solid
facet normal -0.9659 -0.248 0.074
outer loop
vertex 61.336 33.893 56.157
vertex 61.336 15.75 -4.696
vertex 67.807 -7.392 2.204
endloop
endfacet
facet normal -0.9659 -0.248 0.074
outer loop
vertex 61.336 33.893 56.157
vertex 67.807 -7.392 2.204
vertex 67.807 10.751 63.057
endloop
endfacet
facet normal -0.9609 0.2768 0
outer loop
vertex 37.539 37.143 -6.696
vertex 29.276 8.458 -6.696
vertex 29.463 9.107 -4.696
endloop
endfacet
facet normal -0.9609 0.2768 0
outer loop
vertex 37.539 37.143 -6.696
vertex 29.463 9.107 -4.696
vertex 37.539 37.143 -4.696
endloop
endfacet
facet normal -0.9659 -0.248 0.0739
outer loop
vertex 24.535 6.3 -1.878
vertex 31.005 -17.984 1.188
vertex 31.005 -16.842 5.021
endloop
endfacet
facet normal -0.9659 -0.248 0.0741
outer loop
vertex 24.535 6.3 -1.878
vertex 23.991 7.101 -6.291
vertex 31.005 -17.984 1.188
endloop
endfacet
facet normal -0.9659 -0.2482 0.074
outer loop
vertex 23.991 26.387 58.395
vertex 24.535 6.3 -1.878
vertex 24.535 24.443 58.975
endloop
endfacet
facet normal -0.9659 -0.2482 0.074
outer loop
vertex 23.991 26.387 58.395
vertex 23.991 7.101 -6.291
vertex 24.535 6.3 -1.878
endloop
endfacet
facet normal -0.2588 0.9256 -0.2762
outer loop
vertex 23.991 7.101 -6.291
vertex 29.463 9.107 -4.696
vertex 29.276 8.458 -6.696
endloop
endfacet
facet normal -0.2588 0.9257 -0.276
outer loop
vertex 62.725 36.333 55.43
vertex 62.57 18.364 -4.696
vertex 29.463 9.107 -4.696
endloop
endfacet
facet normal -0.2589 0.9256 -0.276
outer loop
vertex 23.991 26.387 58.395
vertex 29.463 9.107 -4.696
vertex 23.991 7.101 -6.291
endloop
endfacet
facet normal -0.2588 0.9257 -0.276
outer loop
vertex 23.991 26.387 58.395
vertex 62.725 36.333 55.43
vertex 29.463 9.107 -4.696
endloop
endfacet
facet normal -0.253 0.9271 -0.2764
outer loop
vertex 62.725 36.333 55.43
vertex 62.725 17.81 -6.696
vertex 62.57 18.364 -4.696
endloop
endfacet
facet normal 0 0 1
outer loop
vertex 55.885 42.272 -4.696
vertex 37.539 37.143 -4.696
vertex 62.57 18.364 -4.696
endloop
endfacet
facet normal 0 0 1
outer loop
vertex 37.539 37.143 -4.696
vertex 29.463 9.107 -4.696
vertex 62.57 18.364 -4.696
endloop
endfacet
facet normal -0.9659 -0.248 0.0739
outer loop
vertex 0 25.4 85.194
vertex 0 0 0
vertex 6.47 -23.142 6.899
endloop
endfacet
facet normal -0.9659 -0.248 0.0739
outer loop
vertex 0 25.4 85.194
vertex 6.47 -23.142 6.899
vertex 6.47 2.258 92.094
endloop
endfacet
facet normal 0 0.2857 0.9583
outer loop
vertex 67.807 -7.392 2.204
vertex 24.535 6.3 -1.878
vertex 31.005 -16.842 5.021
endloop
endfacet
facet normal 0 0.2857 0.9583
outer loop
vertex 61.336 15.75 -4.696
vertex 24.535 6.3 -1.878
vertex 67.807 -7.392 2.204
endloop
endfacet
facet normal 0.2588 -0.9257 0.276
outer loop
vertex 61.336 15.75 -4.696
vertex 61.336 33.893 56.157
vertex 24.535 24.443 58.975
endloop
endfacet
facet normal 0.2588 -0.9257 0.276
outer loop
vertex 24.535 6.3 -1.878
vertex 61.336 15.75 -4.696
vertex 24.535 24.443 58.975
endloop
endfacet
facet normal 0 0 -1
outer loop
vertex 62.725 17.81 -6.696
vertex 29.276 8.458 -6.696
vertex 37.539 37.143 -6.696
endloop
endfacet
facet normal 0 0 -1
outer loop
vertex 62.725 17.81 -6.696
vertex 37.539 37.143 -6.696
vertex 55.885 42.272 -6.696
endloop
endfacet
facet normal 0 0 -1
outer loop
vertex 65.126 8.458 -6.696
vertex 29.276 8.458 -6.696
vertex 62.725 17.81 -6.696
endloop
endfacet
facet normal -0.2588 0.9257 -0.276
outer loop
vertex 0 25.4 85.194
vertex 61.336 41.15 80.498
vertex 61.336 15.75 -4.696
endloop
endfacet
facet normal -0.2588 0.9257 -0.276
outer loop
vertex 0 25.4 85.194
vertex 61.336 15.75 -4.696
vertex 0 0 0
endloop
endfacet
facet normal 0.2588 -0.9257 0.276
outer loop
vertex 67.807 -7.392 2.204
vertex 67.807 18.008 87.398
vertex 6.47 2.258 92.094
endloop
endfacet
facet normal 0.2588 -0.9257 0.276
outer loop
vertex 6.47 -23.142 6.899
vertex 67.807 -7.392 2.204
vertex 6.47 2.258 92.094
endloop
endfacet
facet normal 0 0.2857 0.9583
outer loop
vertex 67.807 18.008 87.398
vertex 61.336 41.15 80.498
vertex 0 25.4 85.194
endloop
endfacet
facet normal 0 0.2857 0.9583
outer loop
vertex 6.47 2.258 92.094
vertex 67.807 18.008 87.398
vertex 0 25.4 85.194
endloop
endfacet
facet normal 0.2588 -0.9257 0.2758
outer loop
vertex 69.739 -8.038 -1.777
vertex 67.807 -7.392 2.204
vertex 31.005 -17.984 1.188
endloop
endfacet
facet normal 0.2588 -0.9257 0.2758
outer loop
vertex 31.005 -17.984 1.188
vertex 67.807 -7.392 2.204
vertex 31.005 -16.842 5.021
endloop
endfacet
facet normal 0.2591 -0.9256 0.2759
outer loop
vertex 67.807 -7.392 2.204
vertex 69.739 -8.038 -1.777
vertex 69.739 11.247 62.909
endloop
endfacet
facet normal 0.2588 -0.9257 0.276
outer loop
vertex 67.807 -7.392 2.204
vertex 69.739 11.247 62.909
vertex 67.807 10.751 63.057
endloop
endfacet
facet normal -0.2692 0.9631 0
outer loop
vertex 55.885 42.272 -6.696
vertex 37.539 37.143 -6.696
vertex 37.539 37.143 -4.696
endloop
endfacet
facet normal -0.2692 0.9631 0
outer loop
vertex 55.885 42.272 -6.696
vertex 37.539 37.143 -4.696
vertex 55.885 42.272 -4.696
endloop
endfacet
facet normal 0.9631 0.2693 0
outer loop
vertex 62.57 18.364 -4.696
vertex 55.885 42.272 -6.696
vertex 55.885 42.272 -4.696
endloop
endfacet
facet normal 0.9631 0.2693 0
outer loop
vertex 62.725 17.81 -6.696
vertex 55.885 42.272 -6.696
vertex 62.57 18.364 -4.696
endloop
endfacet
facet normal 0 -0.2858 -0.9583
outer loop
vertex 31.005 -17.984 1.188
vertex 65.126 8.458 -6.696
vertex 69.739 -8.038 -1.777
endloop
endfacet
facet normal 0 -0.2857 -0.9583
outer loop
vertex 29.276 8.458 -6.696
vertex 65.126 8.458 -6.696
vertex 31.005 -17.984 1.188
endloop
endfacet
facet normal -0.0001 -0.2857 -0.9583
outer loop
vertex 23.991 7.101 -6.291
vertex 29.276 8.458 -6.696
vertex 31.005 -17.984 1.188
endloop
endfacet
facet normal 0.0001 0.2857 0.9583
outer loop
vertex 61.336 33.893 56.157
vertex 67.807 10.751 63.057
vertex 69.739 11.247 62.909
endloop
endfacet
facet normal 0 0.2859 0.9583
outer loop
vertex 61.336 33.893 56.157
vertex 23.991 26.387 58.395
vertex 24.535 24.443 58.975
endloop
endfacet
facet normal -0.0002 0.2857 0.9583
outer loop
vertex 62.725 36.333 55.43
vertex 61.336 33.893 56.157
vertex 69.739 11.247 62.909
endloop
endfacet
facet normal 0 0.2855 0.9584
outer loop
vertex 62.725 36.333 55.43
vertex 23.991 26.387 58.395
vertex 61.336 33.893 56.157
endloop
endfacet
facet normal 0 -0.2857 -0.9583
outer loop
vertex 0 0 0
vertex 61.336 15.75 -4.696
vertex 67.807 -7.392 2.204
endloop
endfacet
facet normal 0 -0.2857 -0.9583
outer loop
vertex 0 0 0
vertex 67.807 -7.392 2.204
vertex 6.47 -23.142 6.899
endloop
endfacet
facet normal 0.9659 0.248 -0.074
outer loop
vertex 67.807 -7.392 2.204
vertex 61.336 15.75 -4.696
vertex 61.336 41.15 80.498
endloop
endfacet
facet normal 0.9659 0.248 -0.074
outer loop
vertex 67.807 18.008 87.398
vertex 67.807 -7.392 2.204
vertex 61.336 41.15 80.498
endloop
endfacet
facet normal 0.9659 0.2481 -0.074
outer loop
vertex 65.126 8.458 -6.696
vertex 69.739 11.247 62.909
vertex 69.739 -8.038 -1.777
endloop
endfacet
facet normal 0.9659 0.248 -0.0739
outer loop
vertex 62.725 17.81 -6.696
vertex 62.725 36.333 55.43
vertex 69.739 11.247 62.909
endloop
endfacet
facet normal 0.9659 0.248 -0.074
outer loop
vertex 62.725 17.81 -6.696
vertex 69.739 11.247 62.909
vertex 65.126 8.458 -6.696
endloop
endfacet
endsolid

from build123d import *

# Parameters (mm, degrees)
F2_W      = 63.5
F2_H      = 88.9
F3_DEPTH  = 25
F5_W      = 38.1
F5_H      = 63.5
F6_DEPTH  = 2.1
F7_DEPTH  = 25
F10_DEPTH = 25
F12_DEPTH = 2


with BuildPart() as f3:
    # F2 (on face) → F3 (new body)
    with BuildSketch(Plane(origin=(0, 0, 0), x_dir=(-0.9659258263, -0.2480301337, 0.0739482986), z_dir=(-0.2588190451, 0.9256610609, -0.2759788075))):
        with Locations((-31.75, 44.45)):
            Rectangle(F2_W, F2_H)
    extrude(amount=-F3_DEPTH)


with BuildPart() as f6:
    # F5 (on face) → F6 (new body)
    with BuildSketch(Plane(origin=(0, 0, 0), x_dir=(-0.9659258263, -0.2480301337, 0.0739482986), z_dir=(-0.2588190451, 0.9256610609, -0.2759788075))):
        with Locations((-44.45, 31.75)):
            Rectangle(F5_W, F5_H)
        Polygon((-63.5, 0), (-63.5, 63.5), (-65.5, 63.5), (-65.5, -4), (-25.4, -4), (-25.4, 0), align=None)
    extrude(amount=F6_DEPTH)

    # F5 (on face) → F7 (join)
    with BuildSketch(Plane(origin=(0, 0, 0), x_dir=(-0.9659258263, -0.2480301337, 0.0739482986), z_dir=(-0.2588190451, 0.9256610609, -0.2759788075))):
        Polygon((-63.5, 0), (-63.5, 63.5), (-65.5, 63.5), (-65.5, -4), (-25.4, -4), (-25.4, 0), align=None)
    extrude(amount=-F7_DEPTH)

    # F9 (on offset) → F10 (cut)
    with BuildSketch(Plane.XY.offset(-6.6957169611)):
        Polygon((62.7246216272, 17.0470048449), (69.7386177495, -8.038409906), (62.7246216272, 36.3327191306), (23.990995993, 26.3867107677), (23.990995993, 7.100996482), align=None)
        Polygon((23.990995993, 7.100996482), (31.0049921153, -17.9844182688), (69.7386177495, -8.038409906), (62.7246216272, 17.0470048449), align=None)
    extrude(amount=-F10_DEPTH, mode=Mode.SUBTRACT)

    # F11 (on face) → F12 (join)
    with BuildSketch(Plane(origin=(0, 0, -6.6957169611), x_dir=(1, 0, 0), z_dir=(0, 0, -1))):
        Polygon((55.8849921191, -42.2722575994), (62.7246216272, -17.8104615044), (29.2761528743, -8.4581174248), (37.5386450479, -37.1425354683), align=None)
    extrude(amount=-F12_DEPTH)


solid = Compound([f3.part, f6.part])
